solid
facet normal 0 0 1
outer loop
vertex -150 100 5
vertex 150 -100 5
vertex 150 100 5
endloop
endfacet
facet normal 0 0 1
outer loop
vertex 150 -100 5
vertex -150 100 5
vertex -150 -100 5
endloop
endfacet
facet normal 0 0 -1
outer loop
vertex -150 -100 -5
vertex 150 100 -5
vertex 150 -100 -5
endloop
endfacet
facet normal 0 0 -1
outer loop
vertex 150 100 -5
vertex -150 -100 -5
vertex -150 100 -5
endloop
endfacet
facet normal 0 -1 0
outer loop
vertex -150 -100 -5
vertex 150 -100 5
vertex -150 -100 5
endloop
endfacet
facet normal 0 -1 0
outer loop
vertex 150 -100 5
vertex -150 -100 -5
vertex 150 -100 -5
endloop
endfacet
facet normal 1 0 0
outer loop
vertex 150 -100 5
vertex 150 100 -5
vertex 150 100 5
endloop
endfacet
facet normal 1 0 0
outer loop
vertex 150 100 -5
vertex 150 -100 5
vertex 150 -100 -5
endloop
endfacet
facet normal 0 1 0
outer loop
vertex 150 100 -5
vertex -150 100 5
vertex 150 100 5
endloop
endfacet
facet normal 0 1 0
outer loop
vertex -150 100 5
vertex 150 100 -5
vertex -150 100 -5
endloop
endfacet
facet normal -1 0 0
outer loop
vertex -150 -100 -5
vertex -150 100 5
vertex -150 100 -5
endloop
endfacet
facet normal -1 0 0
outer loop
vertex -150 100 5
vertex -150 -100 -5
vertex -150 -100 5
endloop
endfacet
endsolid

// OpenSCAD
// Parameters
plate_length = 300; //[150:600:1]
plate_width = 200; //[100:400:1]
plate_thickness = 10; //[5:20:1]

// Geometry
module tooling_plate_body() {
  color("Silver") // Aluminum color
  cube([plate_length, plate_width, plate_thickness], center=true);
}

// Final Output
tooling_plate_body();
